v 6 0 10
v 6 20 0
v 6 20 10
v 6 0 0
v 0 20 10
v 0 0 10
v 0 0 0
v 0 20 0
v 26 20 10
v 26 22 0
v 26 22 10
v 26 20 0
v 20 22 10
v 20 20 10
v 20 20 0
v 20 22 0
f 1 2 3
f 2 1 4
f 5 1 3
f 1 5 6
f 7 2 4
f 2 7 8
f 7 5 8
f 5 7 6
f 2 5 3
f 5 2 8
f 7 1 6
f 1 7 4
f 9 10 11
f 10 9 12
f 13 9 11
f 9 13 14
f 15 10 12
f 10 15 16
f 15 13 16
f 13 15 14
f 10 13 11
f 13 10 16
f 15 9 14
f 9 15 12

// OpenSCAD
card_height = 10;
card_width = 6;
card_depth = 0.2;

module card_pile(n) 
    cube([card_width,n*card_depth,card_height]);


card_pile(100);
translate([20,20,0]) card_pile(10);
